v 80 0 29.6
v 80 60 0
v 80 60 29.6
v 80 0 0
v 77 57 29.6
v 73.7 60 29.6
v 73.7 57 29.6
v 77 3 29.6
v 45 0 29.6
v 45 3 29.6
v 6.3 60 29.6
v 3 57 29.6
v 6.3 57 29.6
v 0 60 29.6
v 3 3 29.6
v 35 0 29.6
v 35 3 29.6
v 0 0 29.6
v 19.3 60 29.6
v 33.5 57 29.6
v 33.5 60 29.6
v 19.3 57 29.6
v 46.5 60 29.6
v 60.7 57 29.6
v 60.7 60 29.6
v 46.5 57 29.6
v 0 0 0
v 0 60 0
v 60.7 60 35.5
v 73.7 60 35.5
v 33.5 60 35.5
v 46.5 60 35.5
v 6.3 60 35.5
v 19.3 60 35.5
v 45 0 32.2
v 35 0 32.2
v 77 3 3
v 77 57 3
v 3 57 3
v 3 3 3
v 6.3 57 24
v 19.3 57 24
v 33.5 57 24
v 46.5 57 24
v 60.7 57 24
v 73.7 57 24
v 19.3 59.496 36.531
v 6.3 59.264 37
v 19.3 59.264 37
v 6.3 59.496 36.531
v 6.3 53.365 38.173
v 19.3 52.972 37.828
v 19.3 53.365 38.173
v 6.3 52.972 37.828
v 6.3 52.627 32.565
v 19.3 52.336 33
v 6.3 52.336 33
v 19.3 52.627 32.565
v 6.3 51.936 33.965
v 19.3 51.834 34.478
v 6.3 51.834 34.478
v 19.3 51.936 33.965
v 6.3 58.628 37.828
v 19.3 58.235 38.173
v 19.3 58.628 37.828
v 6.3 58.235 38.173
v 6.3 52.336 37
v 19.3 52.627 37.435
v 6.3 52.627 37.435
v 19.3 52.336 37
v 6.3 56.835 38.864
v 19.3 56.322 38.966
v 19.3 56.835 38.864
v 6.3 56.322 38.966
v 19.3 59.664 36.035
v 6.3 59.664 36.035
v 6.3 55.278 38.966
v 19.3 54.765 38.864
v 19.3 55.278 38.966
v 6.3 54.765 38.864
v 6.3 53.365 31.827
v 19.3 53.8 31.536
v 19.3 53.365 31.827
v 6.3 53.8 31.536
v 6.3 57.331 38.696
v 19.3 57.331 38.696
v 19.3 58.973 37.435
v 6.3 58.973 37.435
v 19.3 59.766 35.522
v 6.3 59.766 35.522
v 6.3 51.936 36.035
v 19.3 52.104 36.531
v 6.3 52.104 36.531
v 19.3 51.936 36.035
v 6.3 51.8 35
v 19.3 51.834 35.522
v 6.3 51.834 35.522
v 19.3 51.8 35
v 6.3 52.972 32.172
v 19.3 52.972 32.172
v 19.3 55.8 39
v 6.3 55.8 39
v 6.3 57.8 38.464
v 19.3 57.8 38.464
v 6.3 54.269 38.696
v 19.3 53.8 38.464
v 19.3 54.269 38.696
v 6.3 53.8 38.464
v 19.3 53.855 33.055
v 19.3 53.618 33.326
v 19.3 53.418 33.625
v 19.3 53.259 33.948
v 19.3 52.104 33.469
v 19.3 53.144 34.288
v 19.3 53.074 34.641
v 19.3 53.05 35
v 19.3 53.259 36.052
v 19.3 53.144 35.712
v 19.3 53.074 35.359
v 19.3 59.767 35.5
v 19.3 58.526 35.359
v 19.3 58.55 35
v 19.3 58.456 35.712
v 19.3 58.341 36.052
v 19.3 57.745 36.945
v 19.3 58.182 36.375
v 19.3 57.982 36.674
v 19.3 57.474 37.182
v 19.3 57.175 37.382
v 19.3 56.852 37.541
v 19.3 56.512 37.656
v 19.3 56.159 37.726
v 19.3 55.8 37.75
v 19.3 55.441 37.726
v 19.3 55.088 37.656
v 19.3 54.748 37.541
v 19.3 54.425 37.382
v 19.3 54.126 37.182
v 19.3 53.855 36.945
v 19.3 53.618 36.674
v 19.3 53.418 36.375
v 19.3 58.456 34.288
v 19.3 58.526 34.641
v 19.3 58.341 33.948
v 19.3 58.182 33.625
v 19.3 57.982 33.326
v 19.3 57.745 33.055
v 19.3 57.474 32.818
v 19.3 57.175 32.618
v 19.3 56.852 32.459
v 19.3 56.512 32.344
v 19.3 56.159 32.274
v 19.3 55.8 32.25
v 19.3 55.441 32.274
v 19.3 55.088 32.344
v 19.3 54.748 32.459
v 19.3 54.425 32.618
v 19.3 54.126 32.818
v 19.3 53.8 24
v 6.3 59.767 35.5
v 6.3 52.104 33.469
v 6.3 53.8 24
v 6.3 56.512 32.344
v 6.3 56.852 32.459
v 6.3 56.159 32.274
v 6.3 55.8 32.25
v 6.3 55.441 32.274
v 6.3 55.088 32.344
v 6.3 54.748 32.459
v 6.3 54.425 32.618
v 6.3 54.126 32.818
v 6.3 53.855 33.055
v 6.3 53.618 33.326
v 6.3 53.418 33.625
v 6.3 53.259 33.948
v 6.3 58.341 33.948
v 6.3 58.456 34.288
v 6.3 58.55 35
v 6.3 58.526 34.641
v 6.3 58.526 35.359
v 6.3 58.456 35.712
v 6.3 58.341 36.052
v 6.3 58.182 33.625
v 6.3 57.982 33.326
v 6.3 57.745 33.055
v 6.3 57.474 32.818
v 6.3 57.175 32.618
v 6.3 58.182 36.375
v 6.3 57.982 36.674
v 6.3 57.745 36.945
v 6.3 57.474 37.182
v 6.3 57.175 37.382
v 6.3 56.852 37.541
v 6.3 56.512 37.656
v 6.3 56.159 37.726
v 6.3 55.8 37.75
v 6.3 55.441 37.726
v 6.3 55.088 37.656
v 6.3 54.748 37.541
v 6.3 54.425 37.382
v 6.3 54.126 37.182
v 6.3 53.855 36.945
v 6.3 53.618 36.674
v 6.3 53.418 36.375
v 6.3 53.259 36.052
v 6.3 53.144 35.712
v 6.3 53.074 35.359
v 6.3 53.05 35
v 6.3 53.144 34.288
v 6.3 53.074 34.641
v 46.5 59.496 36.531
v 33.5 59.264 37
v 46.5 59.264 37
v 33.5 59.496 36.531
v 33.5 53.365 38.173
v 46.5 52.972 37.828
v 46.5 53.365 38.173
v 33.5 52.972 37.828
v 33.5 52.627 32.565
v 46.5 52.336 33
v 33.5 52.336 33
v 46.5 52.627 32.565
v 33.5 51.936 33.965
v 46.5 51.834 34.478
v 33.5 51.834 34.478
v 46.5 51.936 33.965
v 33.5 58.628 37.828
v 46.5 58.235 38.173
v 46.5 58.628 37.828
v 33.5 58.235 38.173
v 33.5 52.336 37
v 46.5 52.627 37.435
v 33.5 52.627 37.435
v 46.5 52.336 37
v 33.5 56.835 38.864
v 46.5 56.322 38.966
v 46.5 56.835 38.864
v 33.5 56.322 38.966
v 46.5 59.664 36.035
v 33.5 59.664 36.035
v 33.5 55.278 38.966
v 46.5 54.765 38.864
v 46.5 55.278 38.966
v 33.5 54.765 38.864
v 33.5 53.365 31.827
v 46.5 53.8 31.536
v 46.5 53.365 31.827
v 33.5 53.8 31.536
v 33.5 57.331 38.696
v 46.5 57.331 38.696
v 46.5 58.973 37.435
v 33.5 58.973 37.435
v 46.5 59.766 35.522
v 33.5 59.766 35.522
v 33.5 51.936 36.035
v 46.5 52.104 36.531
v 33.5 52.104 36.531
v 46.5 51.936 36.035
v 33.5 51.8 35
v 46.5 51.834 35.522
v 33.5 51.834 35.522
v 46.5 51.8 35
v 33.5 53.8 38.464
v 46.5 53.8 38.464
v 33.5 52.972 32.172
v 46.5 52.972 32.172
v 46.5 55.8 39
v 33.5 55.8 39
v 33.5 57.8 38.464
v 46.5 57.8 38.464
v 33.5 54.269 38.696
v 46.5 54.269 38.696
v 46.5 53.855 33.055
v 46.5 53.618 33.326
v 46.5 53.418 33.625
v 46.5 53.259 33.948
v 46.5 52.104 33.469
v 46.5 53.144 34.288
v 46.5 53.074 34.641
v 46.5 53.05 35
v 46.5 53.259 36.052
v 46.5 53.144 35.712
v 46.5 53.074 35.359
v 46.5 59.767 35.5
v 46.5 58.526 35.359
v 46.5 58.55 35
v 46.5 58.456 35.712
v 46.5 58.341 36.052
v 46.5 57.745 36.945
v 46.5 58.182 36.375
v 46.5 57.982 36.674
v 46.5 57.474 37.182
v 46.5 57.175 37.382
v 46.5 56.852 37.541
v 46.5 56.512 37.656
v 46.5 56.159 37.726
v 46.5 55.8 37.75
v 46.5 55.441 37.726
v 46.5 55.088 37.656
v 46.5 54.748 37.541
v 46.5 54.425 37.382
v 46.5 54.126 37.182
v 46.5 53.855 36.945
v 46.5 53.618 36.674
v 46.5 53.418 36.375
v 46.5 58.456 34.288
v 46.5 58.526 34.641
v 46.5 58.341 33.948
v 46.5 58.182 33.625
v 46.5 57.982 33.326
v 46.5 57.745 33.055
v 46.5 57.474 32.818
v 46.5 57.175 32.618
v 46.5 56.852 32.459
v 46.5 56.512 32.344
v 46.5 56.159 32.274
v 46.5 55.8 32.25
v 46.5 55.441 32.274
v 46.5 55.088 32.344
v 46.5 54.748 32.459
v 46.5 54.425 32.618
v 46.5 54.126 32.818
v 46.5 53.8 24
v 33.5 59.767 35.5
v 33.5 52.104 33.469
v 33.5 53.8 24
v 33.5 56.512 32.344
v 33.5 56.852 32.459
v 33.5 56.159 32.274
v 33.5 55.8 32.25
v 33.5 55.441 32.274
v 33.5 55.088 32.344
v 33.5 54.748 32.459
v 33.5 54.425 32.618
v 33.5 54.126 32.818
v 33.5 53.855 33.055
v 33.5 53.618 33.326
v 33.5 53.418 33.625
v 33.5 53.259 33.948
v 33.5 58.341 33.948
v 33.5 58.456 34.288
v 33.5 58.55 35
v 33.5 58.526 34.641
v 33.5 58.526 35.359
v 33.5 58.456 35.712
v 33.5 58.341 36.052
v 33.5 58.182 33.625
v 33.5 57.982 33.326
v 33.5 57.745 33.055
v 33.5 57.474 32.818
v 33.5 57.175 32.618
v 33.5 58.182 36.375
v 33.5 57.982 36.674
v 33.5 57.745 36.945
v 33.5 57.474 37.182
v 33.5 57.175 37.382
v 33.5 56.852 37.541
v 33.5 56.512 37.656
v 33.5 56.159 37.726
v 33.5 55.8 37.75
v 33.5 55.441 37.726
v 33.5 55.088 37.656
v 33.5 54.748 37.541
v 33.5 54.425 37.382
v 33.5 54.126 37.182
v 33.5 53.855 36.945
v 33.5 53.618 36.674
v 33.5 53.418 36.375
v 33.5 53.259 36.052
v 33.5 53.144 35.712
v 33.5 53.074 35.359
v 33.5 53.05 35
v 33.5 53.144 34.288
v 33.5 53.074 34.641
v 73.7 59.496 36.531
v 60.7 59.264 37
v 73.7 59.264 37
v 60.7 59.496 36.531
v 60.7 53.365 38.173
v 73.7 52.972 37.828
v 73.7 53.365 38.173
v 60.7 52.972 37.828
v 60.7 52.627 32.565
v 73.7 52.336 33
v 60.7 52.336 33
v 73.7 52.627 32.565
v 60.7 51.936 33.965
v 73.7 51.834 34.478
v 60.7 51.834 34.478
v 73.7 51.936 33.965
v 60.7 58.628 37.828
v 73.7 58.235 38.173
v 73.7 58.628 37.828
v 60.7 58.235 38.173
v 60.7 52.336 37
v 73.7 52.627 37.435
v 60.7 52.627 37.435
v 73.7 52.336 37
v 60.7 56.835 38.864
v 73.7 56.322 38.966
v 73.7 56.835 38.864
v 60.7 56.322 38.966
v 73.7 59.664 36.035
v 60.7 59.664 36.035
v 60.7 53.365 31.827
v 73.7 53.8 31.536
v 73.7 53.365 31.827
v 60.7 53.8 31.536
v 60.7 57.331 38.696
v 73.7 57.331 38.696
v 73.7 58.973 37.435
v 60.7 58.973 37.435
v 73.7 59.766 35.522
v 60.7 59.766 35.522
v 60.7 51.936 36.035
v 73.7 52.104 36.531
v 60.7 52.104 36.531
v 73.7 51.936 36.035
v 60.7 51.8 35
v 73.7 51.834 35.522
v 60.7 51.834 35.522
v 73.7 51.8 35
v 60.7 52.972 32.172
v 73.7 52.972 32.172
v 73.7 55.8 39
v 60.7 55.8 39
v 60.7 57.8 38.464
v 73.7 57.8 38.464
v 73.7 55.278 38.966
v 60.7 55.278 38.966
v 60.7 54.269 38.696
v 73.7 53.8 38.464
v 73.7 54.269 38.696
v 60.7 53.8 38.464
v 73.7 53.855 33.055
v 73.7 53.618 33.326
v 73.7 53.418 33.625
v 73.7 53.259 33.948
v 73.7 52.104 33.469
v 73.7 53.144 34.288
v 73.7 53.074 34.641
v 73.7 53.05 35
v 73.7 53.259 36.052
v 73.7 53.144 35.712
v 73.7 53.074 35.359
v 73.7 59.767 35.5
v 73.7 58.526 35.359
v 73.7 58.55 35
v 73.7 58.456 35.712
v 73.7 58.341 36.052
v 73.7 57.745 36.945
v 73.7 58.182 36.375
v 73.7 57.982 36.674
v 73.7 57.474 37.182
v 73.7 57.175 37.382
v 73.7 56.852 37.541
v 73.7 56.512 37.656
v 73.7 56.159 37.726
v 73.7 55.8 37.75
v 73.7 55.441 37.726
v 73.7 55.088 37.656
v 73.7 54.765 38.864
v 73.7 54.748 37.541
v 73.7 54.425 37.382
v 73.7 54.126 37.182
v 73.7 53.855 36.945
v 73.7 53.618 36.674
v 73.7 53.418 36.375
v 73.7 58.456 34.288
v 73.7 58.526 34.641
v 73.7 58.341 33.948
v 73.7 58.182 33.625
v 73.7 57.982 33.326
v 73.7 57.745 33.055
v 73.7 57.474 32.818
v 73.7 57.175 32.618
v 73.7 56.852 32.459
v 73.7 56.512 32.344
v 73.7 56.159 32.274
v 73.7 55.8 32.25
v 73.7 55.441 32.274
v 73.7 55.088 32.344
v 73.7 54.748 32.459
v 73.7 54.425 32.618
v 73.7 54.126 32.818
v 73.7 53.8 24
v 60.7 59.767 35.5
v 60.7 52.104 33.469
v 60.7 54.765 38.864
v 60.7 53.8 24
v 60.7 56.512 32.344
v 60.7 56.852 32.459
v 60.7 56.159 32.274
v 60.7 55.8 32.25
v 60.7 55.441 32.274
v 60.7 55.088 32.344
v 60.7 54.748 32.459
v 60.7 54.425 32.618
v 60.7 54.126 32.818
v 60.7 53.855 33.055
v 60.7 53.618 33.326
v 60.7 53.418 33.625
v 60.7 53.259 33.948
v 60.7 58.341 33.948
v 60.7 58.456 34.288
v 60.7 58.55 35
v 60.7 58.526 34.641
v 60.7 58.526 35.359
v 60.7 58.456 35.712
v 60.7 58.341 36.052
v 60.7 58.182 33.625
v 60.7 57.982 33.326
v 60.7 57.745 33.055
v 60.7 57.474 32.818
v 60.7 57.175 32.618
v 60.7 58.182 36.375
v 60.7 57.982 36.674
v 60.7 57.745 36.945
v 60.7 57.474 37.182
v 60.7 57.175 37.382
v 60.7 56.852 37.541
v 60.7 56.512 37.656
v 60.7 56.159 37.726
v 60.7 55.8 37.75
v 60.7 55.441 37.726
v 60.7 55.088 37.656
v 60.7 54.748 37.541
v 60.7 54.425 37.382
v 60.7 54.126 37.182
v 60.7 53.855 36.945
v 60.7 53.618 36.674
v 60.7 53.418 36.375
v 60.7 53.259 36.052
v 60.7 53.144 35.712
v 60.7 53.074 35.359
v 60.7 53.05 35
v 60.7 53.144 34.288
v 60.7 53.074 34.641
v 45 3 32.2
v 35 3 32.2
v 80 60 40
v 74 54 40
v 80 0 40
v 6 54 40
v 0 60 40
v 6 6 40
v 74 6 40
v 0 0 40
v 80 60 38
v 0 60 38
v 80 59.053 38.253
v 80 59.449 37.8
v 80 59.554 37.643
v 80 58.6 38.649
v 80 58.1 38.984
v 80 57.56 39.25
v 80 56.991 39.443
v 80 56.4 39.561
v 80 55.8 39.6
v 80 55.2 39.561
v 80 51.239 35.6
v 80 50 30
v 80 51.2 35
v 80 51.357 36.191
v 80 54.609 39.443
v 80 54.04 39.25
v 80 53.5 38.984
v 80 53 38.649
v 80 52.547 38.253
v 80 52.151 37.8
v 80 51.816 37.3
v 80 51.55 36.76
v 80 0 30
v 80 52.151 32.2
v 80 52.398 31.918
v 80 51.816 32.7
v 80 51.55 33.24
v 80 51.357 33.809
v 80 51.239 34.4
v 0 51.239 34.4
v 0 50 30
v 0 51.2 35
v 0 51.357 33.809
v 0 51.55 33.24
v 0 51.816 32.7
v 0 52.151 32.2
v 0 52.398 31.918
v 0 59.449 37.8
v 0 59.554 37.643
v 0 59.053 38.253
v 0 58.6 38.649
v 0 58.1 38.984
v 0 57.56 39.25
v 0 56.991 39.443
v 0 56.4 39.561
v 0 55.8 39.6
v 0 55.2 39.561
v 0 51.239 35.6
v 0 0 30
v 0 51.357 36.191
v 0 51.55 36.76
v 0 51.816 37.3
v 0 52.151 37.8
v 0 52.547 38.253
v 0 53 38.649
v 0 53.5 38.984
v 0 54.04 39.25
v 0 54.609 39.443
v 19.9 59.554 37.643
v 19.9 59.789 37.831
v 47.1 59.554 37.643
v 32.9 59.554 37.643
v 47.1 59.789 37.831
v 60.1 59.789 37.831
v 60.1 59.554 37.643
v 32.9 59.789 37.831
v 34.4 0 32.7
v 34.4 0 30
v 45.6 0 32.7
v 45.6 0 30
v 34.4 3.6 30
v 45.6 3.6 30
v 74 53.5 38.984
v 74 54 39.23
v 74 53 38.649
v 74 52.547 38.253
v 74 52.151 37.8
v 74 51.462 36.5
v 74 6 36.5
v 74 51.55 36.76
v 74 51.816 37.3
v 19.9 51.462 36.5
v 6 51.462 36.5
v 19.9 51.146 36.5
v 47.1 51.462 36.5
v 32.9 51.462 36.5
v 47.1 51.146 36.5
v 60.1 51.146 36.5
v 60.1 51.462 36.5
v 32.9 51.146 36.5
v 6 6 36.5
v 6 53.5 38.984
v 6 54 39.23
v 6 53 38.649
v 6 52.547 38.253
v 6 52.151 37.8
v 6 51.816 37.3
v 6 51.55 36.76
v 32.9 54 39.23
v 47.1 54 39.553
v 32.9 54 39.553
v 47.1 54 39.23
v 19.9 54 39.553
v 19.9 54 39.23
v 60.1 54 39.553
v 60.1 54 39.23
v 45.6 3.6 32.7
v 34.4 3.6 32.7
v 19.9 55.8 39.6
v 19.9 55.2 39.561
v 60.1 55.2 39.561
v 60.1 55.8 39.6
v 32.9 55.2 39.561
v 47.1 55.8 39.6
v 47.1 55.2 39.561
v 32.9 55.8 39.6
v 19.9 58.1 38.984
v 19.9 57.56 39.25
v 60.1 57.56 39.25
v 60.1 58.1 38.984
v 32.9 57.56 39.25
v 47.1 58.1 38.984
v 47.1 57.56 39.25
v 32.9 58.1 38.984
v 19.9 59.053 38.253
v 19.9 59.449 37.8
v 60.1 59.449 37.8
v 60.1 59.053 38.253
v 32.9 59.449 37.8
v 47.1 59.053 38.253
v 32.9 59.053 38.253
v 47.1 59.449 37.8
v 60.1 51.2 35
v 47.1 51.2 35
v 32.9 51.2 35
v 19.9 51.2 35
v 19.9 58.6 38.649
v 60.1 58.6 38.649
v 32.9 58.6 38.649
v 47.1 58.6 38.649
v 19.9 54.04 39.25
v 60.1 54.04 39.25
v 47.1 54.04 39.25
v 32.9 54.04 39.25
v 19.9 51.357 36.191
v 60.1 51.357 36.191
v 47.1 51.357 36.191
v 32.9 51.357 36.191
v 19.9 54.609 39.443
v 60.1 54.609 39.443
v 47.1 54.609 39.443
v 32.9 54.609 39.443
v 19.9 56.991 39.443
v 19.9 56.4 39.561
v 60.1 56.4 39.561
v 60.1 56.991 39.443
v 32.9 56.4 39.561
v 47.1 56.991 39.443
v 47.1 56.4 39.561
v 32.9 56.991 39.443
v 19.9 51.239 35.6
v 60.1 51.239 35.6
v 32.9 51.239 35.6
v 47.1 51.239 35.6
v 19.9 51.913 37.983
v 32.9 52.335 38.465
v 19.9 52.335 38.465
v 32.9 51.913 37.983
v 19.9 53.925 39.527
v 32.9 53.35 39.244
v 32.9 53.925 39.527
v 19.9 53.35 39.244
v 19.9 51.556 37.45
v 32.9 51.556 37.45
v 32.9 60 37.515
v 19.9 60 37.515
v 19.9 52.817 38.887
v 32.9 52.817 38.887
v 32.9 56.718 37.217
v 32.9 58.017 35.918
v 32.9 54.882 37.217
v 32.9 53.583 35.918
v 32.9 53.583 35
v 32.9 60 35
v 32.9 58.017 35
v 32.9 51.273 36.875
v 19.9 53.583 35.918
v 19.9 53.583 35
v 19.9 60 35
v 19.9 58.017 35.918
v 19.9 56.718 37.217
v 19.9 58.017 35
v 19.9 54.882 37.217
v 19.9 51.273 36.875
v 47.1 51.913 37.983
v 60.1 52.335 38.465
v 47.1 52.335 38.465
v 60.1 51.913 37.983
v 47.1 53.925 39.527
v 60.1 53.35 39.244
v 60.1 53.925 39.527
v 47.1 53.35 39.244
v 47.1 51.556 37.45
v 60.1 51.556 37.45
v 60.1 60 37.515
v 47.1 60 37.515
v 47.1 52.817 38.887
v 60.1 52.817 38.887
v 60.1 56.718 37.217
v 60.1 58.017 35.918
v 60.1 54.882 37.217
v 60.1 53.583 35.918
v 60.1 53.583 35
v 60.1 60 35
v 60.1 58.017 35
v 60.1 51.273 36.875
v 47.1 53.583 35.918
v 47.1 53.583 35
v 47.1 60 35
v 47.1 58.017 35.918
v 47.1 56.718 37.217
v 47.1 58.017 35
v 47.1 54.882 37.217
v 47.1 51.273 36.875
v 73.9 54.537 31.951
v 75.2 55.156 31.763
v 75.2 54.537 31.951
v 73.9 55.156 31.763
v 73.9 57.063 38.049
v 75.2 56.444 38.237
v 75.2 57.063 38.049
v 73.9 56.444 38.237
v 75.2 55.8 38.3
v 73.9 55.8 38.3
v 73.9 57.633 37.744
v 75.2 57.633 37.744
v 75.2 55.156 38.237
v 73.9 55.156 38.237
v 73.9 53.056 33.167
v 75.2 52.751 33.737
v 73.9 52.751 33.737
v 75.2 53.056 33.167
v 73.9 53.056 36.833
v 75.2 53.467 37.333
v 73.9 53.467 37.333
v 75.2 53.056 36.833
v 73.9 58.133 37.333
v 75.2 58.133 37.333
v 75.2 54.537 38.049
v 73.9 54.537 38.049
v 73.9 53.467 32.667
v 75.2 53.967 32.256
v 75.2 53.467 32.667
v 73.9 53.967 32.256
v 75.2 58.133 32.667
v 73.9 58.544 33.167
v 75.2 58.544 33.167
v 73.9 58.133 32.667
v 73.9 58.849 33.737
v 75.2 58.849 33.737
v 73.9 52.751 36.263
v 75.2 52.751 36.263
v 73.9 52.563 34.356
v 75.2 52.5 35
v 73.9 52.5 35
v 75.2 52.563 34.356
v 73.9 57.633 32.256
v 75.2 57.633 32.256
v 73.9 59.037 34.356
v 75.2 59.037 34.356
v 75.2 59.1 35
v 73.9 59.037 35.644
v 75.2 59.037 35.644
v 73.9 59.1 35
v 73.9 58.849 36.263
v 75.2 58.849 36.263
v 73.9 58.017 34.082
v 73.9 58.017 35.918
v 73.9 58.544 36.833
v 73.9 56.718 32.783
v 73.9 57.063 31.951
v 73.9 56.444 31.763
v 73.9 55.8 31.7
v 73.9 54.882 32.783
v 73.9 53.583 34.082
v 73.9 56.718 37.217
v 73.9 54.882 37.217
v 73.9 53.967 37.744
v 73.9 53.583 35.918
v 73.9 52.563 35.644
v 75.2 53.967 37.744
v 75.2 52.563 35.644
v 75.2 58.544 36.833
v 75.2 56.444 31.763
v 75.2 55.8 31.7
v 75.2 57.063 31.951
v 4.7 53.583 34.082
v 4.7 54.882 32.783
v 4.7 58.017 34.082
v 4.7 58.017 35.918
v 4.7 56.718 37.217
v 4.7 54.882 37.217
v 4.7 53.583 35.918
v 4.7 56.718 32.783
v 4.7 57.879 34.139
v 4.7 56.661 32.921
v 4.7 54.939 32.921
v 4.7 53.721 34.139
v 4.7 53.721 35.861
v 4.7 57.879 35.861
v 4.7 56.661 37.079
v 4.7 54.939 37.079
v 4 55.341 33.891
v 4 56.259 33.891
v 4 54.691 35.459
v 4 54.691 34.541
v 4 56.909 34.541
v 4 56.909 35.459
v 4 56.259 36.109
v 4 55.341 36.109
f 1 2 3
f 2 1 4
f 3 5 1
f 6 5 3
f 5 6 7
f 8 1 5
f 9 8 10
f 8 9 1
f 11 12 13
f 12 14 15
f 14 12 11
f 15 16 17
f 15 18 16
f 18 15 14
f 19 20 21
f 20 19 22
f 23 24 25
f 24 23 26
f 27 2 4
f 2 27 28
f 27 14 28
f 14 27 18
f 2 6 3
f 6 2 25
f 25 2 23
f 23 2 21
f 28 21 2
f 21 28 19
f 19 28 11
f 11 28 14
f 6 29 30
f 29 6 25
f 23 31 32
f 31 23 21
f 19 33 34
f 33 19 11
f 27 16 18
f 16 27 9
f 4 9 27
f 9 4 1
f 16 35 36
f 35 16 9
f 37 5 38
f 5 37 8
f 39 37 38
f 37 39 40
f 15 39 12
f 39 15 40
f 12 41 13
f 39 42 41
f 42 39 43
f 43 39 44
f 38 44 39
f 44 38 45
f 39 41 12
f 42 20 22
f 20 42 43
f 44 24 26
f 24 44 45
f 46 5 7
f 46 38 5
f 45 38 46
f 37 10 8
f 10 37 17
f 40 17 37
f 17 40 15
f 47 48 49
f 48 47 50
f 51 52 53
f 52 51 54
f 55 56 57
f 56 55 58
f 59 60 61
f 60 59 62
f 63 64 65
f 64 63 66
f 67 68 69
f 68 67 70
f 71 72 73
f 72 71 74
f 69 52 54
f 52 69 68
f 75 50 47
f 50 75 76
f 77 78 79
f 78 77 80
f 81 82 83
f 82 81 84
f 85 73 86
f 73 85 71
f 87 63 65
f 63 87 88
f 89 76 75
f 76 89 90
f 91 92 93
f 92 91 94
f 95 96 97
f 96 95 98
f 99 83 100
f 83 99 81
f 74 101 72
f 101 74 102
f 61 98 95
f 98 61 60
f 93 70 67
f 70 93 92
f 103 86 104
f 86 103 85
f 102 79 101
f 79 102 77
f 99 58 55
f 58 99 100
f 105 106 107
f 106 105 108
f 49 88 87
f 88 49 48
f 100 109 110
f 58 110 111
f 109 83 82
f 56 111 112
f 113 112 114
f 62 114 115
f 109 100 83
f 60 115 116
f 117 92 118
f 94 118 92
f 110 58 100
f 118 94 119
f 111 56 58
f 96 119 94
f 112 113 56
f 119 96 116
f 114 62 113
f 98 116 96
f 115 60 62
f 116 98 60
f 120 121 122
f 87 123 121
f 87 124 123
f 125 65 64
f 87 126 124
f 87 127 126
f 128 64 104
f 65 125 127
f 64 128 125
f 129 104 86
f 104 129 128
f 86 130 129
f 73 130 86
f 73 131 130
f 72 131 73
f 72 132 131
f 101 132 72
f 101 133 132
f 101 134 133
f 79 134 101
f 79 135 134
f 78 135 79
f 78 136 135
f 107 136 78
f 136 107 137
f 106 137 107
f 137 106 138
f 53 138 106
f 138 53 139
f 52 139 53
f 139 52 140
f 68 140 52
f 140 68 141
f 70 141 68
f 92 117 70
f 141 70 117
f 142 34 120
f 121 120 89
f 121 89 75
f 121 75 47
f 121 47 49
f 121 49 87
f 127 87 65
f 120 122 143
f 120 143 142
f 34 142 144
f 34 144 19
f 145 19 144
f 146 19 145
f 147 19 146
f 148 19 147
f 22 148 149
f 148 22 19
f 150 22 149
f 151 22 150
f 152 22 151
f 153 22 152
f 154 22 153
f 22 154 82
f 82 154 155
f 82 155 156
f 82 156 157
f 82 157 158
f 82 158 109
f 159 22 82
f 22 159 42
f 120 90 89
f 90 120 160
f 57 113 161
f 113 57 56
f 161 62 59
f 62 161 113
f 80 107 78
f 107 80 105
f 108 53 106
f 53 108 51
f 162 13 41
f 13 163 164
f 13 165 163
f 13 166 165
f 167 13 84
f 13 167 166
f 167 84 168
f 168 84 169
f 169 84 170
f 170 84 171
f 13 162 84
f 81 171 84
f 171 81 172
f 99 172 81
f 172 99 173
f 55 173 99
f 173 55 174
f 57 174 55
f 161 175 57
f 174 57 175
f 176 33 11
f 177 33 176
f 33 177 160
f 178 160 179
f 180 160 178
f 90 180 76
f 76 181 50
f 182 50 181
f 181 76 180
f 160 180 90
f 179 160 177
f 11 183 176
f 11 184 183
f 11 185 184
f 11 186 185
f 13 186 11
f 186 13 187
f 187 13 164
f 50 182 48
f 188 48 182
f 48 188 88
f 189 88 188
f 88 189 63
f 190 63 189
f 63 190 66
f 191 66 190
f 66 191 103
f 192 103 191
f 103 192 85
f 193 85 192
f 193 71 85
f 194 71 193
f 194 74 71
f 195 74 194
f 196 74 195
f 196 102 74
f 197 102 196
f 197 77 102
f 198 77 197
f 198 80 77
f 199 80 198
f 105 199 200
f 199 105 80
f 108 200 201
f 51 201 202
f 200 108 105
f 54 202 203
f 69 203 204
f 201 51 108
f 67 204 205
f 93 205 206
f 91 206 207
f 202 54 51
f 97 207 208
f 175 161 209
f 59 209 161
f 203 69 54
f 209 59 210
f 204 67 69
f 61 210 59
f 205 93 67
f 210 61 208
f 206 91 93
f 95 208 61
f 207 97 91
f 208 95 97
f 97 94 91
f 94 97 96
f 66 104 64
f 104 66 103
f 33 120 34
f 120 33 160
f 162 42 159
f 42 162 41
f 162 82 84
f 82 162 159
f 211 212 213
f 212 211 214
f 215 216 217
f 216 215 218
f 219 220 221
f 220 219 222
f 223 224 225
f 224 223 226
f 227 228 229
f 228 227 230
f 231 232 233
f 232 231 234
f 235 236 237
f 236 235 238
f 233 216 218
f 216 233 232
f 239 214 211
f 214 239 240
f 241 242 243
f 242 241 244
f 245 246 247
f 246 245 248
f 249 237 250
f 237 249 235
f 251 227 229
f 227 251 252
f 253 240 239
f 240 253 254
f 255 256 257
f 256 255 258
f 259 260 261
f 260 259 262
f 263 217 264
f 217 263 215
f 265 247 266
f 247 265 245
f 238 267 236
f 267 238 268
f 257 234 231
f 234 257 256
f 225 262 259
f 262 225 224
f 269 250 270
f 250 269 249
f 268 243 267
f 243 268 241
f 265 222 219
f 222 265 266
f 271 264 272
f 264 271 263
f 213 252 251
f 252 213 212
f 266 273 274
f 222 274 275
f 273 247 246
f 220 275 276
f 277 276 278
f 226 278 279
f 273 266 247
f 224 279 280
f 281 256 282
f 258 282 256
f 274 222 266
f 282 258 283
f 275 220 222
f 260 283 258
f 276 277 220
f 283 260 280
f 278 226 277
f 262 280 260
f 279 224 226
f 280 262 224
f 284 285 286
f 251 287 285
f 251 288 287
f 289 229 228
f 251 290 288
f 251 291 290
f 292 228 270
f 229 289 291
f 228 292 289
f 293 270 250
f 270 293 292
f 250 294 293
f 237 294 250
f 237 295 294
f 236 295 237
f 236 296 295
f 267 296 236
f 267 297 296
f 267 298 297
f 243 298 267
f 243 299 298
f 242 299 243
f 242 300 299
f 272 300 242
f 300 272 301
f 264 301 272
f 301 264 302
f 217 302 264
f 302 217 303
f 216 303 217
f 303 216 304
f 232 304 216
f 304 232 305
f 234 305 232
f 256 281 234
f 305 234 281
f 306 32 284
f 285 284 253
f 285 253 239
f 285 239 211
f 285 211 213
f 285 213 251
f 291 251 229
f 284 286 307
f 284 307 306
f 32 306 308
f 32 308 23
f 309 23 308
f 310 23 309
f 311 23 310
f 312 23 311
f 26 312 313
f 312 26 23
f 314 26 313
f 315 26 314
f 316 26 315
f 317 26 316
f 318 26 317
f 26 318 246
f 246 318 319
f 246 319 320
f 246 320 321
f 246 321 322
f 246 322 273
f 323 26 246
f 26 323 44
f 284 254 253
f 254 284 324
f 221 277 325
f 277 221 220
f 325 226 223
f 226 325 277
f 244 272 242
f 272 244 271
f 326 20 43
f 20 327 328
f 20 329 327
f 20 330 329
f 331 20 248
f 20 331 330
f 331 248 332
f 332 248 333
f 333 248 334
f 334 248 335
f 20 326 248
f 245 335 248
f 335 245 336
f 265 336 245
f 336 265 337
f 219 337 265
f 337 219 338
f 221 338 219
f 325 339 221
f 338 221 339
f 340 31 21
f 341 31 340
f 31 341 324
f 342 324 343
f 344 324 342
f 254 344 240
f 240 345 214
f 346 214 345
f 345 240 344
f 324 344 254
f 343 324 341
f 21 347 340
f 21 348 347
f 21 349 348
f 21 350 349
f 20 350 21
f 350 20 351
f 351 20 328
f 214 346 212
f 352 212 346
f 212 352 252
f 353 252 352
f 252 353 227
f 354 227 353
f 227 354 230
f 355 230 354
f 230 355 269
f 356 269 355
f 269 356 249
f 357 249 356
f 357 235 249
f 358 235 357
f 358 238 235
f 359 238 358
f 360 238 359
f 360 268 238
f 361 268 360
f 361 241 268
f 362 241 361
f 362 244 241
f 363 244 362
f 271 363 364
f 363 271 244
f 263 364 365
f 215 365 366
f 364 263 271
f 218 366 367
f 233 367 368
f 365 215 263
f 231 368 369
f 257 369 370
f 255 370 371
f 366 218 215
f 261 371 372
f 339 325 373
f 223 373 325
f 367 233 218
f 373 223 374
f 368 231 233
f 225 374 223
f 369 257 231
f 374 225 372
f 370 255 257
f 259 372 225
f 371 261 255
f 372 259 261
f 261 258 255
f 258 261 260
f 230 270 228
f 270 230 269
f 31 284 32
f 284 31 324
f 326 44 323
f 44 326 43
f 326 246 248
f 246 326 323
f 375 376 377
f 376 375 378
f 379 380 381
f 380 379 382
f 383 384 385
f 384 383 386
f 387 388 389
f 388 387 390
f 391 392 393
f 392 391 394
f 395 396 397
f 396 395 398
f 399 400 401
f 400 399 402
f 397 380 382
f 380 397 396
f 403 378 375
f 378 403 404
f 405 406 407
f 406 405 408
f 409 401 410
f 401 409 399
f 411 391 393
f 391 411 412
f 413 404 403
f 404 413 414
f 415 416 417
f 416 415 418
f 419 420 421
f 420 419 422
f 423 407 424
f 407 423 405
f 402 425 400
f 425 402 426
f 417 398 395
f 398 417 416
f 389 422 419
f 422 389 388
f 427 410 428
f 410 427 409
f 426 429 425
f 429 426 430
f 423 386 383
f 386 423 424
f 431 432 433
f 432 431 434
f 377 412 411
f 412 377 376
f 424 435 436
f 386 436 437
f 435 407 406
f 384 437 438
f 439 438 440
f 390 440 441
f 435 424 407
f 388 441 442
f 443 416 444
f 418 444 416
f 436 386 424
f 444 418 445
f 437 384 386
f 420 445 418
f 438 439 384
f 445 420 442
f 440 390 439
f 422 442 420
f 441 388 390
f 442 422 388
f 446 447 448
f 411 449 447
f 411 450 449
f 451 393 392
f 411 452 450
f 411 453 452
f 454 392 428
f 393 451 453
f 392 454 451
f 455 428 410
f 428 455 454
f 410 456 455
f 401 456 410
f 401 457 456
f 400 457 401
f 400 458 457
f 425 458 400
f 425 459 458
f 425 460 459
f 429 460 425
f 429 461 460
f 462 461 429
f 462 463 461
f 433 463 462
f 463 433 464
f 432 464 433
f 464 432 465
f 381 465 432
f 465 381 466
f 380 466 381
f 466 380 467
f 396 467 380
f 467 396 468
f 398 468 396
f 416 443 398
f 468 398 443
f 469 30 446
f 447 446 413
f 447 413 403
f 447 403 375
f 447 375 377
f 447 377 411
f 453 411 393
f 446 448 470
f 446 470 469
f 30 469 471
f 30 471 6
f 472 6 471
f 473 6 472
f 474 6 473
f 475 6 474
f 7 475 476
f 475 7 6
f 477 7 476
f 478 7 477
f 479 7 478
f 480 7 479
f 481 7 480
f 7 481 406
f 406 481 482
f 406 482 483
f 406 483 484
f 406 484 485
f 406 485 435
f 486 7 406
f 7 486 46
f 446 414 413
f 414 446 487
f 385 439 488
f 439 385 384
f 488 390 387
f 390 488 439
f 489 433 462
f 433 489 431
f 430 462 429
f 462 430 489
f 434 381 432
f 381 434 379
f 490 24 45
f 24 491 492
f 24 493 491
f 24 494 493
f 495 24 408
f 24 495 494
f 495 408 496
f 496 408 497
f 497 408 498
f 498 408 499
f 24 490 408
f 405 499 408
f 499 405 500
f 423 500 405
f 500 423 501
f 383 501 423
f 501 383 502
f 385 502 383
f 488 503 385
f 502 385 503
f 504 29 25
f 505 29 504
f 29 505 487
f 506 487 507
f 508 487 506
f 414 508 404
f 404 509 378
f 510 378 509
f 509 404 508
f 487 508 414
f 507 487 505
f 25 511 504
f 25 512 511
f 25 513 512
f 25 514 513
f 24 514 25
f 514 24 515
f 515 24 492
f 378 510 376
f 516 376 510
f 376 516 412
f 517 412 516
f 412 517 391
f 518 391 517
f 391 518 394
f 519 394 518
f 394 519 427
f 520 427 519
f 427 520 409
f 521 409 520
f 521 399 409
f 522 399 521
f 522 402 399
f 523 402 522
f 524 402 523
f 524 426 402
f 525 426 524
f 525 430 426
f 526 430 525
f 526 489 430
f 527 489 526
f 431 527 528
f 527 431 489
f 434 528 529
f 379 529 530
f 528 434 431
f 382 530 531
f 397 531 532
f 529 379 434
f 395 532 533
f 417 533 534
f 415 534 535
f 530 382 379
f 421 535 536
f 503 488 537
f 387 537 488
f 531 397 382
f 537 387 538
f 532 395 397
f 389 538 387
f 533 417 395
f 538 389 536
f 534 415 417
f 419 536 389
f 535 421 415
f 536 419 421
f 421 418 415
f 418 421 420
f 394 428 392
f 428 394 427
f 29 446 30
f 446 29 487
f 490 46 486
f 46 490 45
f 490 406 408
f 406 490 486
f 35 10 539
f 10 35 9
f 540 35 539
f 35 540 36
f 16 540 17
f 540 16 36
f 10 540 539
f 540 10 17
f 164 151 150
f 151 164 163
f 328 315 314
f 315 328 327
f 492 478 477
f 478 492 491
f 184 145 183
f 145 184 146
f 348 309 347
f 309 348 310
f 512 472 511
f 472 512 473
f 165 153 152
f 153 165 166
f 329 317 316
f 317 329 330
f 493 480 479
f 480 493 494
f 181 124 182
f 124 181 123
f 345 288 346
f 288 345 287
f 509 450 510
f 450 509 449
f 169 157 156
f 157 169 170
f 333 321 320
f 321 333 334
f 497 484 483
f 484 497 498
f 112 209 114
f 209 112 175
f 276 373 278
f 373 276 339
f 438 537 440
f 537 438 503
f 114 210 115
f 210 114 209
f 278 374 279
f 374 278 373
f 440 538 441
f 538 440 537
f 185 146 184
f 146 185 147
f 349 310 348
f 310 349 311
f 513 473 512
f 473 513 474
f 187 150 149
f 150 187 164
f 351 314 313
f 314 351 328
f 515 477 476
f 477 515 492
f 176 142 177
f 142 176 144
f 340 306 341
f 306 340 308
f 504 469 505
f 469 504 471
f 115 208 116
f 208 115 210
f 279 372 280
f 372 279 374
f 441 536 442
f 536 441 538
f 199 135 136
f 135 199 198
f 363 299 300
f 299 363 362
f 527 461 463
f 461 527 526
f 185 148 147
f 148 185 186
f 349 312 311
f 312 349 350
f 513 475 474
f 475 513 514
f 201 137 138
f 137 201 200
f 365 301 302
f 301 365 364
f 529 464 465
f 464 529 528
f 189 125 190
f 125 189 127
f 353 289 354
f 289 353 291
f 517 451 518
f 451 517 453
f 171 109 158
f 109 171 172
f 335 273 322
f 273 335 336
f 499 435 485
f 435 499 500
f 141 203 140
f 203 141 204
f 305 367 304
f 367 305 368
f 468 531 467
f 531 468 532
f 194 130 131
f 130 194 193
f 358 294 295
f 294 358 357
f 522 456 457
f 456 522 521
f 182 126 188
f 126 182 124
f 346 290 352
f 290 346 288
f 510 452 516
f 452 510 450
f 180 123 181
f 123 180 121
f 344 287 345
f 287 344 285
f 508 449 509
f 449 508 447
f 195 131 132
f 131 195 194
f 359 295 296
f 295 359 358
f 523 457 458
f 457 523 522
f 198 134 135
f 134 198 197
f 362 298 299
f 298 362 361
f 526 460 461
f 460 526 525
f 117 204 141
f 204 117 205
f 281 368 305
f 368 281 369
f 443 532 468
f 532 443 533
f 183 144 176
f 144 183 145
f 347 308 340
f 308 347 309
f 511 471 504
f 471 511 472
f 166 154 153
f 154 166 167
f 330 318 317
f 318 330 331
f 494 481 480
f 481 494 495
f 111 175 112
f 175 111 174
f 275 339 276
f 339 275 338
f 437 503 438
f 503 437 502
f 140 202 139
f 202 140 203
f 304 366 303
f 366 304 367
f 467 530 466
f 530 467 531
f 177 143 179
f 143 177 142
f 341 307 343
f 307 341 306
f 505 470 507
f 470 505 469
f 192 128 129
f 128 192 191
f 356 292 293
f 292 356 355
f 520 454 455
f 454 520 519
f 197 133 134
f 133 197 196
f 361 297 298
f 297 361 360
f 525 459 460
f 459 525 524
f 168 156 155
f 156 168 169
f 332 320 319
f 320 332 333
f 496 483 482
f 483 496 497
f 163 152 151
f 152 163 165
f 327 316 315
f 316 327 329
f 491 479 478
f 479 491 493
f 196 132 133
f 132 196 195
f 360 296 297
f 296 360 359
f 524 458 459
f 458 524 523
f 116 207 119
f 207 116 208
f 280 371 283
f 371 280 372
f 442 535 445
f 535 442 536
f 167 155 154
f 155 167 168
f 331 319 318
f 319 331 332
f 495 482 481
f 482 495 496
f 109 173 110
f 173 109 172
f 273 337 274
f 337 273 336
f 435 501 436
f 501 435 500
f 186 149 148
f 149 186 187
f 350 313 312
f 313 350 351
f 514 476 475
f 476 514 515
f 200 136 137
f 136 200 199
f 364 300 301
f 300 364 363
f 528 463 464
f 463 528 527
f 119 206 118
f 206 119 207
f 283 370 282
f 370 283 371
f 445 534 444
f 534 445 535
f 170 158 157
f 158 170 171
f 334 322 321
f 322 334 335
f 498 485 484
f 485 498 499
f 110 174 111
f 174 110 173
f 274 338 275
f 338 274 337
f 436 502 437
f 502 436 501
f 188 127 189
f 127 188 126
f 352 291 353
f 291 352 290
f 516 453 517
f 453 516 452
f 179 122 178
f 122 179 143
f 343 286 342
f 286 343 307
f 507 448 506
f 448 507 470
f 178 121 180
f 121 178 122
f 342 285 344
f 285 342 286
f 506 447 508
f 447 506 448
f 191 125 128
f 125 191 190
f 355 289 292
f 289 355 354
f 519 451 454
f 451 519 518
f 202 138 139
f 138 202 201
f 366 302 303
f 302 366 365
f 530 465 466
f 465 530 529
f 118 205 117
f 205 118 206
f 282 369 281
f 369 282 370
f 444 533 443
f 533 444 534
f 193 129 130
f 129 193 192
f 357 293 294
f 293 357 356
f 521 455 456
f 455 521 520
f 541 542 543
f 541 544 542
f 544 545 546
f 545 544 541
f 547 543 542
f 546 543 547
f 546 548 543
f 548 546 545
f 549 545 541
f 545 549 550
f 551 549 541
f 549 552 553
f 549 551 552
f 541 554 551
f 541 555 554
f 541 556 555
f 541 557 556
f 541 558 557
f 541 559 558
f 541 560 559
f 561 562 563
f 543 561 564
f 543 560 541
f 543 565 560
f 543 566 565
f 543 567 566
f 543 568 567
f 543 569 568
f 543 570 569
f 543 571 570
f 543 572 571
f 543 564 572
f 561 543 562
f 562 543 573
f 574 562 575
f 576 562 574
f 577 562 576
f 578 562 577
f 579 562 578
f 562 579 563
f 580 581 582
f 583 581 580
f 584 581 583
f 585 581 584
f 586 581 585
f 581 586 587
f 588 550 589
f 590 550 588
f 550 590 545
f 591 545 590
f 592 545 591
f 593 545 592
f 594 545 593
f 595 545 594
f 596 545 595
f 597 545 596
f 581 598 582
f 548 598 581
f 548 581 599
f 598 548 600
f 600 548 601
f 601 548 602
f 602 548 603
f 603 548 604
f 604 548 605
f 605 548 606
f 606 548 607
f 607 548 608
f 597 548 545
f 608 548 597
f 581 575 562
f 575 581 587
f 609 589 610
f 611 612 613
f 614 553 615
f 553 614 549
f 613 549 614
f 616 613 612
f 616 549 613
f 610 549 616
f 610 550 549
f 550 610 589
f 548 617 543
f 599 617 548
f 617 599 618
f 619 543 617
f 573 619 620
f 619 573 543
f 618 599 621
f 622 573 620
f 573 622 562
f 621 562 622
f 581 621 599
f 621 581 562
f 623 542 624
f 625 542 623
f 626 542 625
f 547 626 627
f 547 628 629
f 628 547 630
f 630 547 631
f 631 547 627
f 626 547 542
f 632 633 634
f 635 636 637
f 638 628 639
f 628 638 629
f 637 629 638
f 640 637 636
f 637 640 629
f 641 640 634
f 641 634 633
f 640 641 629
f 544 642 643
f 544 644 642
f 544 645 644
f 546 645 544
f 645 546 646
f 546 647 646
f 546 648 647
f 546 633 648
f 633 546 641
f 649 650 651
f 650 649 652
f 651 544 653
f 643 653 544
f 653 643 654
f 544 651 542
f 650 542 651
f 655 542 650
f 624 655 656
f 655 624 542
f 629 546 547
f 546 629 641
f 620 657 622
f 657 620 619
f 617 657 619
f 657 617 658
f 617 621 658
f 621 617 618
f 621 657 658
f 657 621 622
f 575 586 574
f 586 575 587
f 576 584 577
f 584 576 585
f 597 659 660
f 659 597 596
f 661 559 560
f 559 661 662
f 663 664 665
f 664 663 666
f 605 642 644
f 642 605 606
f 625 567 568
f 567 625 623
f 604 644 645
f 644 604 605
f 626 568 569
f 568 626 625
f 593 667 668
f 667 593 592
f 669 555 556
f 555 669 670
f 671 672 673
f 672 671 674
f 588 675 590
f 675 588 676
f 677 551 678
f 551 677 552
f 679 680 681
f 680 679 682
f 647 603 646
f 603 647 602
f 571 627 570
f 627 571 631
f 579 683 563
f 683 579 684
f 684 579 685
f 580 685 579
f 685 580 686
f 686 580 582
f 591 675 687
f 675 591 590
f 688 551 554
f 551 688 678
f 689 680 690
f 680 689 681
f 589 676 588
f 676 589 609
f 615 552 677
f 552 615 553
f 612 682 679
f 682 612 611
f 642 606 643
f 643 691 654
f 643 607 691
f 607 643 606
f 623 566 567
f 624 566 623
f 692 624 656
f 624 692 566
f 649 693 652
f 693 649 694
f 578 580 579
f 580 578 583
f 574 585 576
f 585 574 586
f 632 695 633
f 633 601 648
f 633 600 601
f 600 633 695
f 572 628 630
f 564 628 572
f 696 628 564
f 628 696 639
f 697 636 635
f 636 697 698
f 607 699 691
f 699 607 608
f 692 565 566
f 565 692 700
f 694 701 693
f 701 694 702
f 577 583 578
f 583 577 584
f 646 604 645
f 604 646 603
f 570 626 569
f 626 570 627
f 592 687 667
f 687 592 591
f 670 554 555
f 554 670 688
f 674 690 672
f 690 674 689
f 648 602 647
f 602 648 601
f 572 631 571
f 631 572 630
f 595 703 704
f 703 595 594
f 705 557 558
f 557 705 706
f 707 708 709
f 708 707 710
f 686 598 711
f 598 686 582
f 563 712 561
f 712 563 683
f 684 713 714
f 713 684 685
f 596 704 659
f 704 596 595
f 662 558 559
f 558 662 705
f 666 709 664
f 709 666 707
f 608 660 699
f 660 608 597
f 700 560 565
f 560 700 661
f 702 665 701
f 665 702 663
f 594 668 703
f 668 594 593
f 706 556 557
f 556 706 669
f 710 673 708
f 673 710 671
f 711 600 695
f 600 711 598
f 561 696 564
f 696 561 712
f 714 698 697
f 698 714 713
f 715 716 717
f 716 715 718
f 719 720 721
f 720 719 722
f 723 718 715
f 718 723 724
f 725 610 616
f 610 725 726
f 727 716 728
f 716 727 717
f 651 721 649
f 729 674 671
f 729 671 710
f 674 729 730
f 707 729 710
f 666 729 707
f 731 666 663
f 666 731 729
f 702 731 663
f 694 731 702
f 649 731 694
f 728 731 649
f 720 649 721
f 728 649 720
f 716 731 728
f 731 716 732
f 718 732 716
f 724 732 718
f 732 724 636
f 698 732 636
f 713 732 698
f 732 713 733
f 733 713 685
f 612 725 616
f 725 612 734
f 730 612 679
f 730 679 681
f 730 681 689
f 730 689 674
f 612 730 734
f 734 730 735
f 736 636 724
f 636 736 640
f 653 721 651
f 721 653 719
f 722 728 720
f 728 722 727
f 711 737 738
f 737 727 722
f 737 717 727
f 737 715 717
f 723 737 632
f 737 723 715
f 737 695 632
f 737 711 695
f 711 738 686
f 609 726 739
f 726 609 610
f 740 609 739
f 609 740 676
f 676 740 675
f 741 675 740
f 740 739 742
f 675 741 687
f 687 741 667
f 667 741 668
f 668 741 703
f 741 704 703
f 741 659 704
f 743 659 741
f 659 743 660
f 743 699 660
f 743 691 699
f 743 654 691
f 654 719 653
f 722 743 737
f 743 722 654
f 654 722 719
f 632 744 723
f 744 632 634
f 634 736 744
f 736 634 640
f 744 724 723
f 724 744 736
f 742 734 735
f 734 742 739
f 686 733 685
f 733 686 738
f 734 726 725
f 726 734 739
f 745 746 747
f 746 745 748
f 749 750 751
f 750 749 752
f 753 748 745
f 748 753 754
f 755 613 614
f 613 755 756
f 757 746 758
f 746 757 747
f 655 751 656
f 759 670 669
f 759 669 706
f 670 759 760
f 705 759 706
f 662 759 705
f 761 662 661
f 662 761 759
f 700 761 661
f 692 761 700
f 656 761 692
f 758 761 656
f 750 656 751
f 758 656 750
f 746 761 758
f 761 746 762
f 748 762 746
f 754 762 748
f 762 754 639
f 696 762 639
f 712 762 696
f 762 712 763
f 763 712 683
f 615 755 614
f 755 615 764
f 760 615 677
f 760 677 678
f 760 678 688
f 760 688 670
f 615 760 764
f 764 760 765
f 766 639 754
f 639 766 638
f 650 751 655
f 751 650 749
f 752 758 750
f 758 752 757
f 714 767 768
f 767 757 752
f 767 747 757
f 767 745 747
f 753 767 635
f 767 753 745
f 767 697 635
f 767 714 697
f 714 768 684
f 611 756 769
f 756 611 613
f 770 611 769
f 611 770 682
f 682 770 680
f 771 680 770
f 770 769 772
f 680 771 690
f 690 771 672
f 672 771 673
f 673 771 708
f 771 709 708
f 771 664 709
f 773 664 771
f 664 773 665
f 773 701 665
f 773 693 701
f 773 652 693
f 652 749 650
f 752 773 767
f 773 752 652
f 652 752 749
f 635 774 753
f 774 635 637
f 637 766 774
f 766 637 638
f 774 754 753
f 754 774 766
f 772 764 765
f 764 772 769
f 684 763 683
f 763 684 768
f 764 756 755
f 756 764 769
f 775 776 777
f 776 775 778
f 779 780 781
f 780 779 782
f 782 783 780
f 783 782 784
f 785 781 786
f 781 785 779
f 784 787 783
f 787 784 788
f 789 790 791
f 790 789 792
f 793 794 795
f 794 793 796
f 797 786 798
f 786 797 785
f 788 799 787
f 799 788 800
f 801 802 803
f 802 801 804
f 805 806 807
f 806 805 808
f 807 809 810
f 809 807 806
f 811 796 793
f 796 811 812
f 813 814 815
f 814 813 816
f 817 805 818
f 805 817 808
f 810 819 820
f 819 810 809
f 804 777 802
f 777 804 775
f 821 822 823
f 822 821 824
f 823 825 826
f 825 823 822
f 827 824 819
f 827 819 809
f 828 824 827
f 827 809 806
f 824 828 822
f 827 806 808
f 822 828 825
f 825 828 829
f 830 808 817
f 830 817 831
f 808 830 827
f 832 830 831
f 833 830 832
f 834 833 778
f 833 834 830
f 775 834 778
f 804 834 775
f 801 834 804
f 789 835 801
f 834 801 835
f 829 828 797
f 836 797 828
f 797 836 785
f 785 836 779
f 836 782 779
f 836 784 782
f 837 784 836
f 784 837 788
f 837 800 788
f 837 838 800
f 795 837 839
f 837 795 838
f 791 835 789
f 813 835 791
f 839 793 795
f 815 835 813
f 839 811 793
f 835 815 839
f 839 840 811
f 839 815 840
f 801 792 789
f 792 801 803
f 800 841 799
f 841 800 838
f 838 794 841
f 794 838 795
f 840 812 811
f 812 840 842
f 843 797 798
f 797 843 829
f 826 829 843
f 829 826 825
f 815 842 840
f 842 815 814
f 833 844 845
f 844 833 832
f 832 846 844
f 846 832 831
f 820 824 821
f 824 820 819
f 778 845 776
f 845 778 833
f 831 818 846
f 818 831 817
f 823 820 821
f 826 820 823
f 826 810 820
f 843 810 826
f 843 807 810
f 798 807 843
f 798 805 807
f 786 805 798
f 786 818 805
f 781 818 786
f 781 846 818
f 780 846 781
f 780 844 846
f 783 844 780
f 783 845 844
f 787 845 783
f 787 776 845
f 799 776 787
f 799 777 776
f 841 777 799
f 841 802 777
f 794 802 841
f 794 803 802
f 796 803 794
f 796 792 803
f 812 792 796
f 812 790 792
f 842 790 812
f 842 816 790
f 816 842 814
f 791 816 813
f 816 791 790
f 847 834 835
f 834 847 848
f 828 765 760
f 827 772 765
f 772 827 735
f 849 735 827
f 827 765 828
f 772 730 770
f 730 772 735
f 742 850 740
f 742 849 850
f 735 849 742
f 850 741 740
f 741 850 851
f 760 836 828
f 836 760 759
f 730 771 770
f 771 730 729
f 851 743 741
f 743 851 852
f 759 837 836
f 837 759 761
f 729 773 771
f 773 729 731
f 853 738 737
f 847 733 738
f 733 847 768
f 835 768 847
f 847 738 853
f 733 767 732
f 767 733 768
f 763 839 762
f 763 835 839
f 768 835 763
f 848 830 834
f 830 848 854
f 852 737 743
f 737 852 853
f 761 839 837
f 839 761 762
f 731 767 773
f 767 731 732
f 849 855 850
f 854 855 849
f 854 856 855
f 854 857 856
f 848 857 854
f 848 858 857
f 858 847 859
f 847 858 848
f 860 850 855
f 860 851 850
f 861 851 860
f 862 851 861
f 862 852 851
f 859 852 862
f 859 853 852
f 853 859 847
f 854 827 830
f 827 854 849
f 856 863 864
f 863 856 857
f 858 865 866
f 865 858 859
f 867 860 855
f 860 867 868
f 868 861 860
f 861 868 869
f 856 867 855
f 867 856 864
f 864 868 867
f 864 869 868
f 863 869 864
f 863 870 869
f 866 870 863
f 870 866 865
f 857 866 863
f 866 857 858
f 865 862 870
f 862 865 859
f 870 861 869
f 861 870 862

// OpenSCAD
// Print-in-place hinged box, 80 x 60 x 40 mm closed.
// Printed closed in PLA (Bambu A1, 0.4 nozzle): base, lid and a captive
// hinge pin are separate bodies with 0.35-0.6 mm clearances, so the hinge
// breaks free by hand.  No supports: the lid underside bridges the cavity,
// the hinge barrels/pin use faceted (octagonal) lower surfaces, and all
// other downward faces are short bridges or rest on the body below.

/* [Part] */
part = "assembly"; // [assembly, box, lid, pin]

/* [Dimensions] */
box_w = 80;          // X, outside
box_d = 60;          // Y, outside (front y=0, back y=60)
box_h = 29.6;        // base height to its rim
lid_h = 10;          // lid height; lid bottom at z=30 (0.4 gap)
lid_z = 30;
wall = 3;
floor_t = 3;
total_h = 40;

hinge_y = 55.8;      // hinge axis, assembly coords
hinge_z = 35;
barrel_r = 4.0;
pin_r = 2.4;         // octagon circumradius
bore_r = 2.75;       // pin_r + 0.35 radial clearance
relief_r = 4.6;      // barrel_r + 0.6

// Alternating knuckles along the back edge (x intervals), 0.6 mm end gaps.
box_segs  = [[6.3, 19.3], [33.5, 46.5], [60.7, 73.7]];
lid_segs  = [[19.9, 32.9], [47.1, 60.1]];

cadverify_only = "";
module instance(name, part_name, unit = 1) {
    echo(cadverify_instance = [name, part_name, unit]);
    if (cadverify_only == "" || cadverify_only == name) children();
}

// ---------------------------------------------------------------- base (box)
module box_main() {
    difference() {
        union() {
            // shell: outer block minus open-top cavity
            difference() {
                cube([box_w, box_d, box_h]);
                translate([wall, wall, floor_t]) cube([box_w - 2 * wall, box_d - 2 * wall, box_h]);
            }
            // hinge knuckles (base) + support posts down to the back wall
            for (s = box_segs) {
                translate([s[0], hinge_y, hinge_z]) rotate([0, 90, 0])
                    cylinder(h = s[1] - s[0], r = barrel_r, $fn = 48);
                translate([s[0], 53.8, 24]) cube([s[1] - s[0], 6.2, 11.5]);
            }
            // front catch tooth (enters the socket in the lid)
            translate([35, 0, box_h]) cube([10, wall, 2.6]);
        }
        // pin bore through the base knuckles
        translate([-1, hinge_y, hinge_z]) rotate([0, 90, 0])
            cylinder(h = box_w + 2, r = bore_r, $fn = 48);
    }
}

// ---------------------------------------------------------------- lid (local: z 0..10, hinge axis at z=5)
module lid_main() {
    union() {
        difference() {
            union() {
                // main slab, side profile (Y-Z) extruded along X.
                // Rear lower edge chamfered 50,0 -> 60,8 so the slab
                // swings clear of the base back wall.
                rotate([0, 90, 0])
                    linear_extrude(height = box_w)
                        polygon(points = [[0, 0], [0, 50], [-8, 60], [-10, 60], [-10, 0]]);
                // hinge knuckles (lid)
                for (s = lid_segs)
                    translate([s[0], hinge_y, 5]) rotate([0, 90, 0])
                        cylinder(h = s[1] - s[0], r = barrel_r, $fn = 48);
            }
            // recessed panel in the top face
            translate([6, 6, 6.5]) cube([68, 48, 4]);
            // front catch socket (tooth: x35..45, z assy 29.6..32.2)
            translate([34.4, -1, -0.5]) cube([11.2, 4.6, 3.2]);
            // clearance tunnel for the base knuckles / pin
            translate([-1, hinge_y, 5]) rotate([0, 90, 0])
                cylinder(h = box_w + 2, r = relief_r, $fn = 48);
            // pin bore through the lid knuckles
            translate([-1, hinge_y, 5]) rotate([0, 90, 0])
                cylinder(h = box_w + 2, r = bore_r, $fn = 48);
        }
        // webs joining lid knuckles to the slab: upper half-discs r=4.9
        // (stay above z=30.1 in assembly, clear of the base rim at 29.6)
        for (s = lid_segs)
            intersection() {
                translate([s[0], hinge_y, 5]) rotate([0, 90, 0])
                    cylinder(h = s[1] - s[0], r = 4.9, $fn = 48);
                translate([s[0], hinge_y - 10, 5]) cube([s[1] - s[0], 20, 5]);
                translate([s[0], 0, 0]) cube([s[1] - s[0], box_d, lid_h]);
            }
    }
}

// ---------------------------------------------------------------- pin
// Centred on its axis, local +Z from head (z=0) to tip (z=71.2).
module pin_geom() {
    union() {
        cylinder(h = 1.3, r = 3.3, $fn = 32);                    // head
        translate([0, 0, 1.0]) rotate([0, 0, 22.5])
            cylinder(h = 69.5, r = pin_r, $fn = 8);              // octagonal shaft
        translate([0, 0, 70.4]) rotate([0, 0, 22.5])
            cylinder(h = 0.8, r1 = pin_r, r2 = 1.2, $fn = 8);    // lead-in tip
    }
}
module pin_part() { translate([3.3, 3.3, 0]) pin_geom(); }

// ---------------------------------------------------------------- output
if (part == "box") {
    echo(cadverify_spec = [
        ["bounds", [[0, 0, 0], [box_w, box_d, hinge_z + barrel_r]]],
        ["bodies", 1],
        ["copies", 1],
        ["support_faces", [["bed", "-z", 4000]]],
        ["overhangs_allowed", [["hinge knuckles and pin bore print in place; faceted bore ceiling is a short internal bridge", [[5, 51, 30], [75, 60, 39.5]]], ["knuckle support ledge underside, 3.2 mm protrusion bridging to the back wall", [[5, 53, 23], [75, 58, 25]]]]],
        ["details", [
            ["cavity", "void", [[4, 4, 10], [76, 53, 29]], 0.95],
            ["front_wall", "thickness", [40, -1, 15], [0, 1, 0], 3],
            ["floor", "thickness", [40, 30, -1], [0, 0, 1], 3],
            ["box_knuckle", "material", [[7, 52, 33.5], [18, 53.8, 36.5]], 0.6],
            ["pin_bore", "void", [[8, 54.9, 34.1], [17, 56.7, 35.9]], 0.9],
            ["catch_tooth", "material", [[36, 0.5, 30], [44, 2.5, 32]], 0.85],
            ["hinge_knuckles", "view", [[4, 50, 28], [76, 60, 39.5]]]
        ]]
    ]);
    box_main();
} else if (part == "lid") {
    echo(cadverify_spec = [
        ["bounds", [[0, 0, 0], [box_w, box_d, lid_h]]],
        ["bodies", 1],
        ["copies", 1],
        ["support_faces", [["print_face", "-z", 3000]]],
        ["overhangs_allowed", [["lid hinge relief, knuckle bores and rear swing chamfer print in place around pin and box knuckles; ceilings are short internal bridges and the chamfer is 51 deg", [[0, 49, 0], [80, 60, 10]]], ["catch socket ceiling, 11 mm bridge across the socket", [[33, 0, 2], [47, 4, 3.5]]]]],
        ["details", [
            ["top_pocket", "void", [[7, 7, 6.6], [73, 53, 9.9]], 0.95],
            ["lid_slab", "thickness", [40, 30, 9], [0, 0, -1], 6.5],
            ["lid_knuckle", "material", [[21, 52, 3.5], [32, 53.8, 6.5]], 0.45],
            ["pin_bore", "void", [[22, 55.4, 4.6], [31, 56.2, 5.4]], 0.45],
            ["catch_socket", "void", [[35, 0.5, 0.2], [45, 2.5, 2.5]], 0.9],
            ["hinge_knuckles", "view", [[4, 50, 0], [76, 60, 10]]]
        ]]
    ]);
    lid_main();
} else if (part == "pin") {
    echo(cadverify_spec = [
        ["bounds", [[0, 0, 0], [6.6, 6.6, 71.2]]],
        ["bodies", 1],
        ["copies", 1],
        ["support_faces", [["head_base", "-z", 30]]],
        ["overhangs_allowed", []],
        ["details", [
            ["pin_shaft", "material", [[2, 2, 10], [4.6, 4.6, 20]], 0.9],
            ["pin_head", "material", [[1, 1, 0.1], [5.6, 5.6, 1.2]], 0.75],
            ["pin_length", "thickness", [1.2, 3.3, 72], [0, 0, -1], 71.2],
            ["pin_head_view", "view", [[0, 0, 0], [6.6, 6.6, 2]]]
        ]]
    ]);
    pin_part();
} else if (part == "assembly") {
    echo(cadverify_spec = [
        ["bounds", [[0, 0, 0], [box_w, box_d, total_h]]],
        ["support_faces", [["bed", "-z", 4000]]],
        ["allowed_interferences", []],
        ["motions", [
            ["lid_swing", ["lid"], "rotate", [0, hinge_y, hinge_z], [-1, 0, 0], [0, 110]]
        ]],
        ["assembly_order", [
            [["base"], [0, 0, 0]],
            [["lid"], [0, 0, -1]],
            [["pin"], [-1, 0, 0]]
        ]]
    ]);
    instance("base", "box") box_main();
    instance("lid", "lid") translate([0, 0, lid_z]) lid_main();
    instance("pin", "pin") translate([75.2, hinge_y, hinge_z]) rotate([0, -90, 0]) pin_geom();
}
